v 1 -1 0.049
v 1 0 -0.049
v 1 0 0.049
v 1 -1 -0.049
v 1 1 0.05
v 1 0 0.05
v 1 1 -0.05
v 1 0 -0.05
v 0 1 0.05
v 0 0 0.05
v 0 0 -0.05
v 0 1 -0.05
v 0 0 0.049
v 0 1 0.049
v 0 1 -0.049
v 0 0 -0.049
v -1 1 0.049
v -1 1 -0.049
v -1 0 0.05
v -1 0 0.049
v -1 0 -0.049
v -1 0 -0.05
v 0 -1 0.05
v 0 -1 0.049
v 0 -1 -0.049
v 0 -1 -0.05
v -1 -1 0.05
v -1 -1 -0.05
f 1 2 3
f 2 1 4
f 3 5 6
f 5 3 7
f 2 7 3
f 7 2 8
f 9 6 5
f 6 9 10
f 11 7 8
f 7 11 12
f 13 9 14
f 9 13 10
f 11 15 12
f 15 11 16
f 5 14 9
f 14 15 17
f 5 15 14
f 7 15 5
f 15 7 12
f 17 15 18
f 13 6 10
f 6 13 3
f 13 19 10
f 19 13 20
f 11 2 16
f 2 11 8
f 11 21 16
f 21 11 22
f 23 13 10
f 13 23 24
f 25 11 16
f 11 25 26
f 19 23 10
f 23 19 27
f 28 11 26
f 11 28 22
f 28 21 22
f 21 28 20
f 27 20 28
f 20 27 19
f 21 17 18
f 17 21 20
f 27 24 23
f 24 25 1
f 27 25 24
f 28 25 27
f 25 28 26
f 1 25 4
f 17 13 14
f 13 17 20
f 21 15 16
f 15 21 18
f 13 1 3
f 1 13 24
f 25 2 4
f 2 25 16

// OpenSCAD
module Floor_01(Mat=0){
    Mat_0 = ["#748481","#c6d4cf"];
    Mat_1 = ["#f2eacf","#baab87"];
    Mat_2 = ["#83a492","#427c9d"];
    
    Material = [Mat_0,Mat_1,Mat_2];
    color(Material[Mat][0])
    translate([0.5,0.5,0])
    cube([1,1,0.1], center = true);


    color(Material[Mat][0])
    translate([-0.5,-0.5,0])
    cube([1,1,0.1], center = true);

               
   color(Material[Mat][1])
    translate([-0.5,0.5,0])
    cube([1,1,0.098], center = true);

    color(Material[Mat][1])
    translate([0.5,-0.5,0])
    cube([1,1,0.098], center = true);
}

Floor_01(Mat = 1);
